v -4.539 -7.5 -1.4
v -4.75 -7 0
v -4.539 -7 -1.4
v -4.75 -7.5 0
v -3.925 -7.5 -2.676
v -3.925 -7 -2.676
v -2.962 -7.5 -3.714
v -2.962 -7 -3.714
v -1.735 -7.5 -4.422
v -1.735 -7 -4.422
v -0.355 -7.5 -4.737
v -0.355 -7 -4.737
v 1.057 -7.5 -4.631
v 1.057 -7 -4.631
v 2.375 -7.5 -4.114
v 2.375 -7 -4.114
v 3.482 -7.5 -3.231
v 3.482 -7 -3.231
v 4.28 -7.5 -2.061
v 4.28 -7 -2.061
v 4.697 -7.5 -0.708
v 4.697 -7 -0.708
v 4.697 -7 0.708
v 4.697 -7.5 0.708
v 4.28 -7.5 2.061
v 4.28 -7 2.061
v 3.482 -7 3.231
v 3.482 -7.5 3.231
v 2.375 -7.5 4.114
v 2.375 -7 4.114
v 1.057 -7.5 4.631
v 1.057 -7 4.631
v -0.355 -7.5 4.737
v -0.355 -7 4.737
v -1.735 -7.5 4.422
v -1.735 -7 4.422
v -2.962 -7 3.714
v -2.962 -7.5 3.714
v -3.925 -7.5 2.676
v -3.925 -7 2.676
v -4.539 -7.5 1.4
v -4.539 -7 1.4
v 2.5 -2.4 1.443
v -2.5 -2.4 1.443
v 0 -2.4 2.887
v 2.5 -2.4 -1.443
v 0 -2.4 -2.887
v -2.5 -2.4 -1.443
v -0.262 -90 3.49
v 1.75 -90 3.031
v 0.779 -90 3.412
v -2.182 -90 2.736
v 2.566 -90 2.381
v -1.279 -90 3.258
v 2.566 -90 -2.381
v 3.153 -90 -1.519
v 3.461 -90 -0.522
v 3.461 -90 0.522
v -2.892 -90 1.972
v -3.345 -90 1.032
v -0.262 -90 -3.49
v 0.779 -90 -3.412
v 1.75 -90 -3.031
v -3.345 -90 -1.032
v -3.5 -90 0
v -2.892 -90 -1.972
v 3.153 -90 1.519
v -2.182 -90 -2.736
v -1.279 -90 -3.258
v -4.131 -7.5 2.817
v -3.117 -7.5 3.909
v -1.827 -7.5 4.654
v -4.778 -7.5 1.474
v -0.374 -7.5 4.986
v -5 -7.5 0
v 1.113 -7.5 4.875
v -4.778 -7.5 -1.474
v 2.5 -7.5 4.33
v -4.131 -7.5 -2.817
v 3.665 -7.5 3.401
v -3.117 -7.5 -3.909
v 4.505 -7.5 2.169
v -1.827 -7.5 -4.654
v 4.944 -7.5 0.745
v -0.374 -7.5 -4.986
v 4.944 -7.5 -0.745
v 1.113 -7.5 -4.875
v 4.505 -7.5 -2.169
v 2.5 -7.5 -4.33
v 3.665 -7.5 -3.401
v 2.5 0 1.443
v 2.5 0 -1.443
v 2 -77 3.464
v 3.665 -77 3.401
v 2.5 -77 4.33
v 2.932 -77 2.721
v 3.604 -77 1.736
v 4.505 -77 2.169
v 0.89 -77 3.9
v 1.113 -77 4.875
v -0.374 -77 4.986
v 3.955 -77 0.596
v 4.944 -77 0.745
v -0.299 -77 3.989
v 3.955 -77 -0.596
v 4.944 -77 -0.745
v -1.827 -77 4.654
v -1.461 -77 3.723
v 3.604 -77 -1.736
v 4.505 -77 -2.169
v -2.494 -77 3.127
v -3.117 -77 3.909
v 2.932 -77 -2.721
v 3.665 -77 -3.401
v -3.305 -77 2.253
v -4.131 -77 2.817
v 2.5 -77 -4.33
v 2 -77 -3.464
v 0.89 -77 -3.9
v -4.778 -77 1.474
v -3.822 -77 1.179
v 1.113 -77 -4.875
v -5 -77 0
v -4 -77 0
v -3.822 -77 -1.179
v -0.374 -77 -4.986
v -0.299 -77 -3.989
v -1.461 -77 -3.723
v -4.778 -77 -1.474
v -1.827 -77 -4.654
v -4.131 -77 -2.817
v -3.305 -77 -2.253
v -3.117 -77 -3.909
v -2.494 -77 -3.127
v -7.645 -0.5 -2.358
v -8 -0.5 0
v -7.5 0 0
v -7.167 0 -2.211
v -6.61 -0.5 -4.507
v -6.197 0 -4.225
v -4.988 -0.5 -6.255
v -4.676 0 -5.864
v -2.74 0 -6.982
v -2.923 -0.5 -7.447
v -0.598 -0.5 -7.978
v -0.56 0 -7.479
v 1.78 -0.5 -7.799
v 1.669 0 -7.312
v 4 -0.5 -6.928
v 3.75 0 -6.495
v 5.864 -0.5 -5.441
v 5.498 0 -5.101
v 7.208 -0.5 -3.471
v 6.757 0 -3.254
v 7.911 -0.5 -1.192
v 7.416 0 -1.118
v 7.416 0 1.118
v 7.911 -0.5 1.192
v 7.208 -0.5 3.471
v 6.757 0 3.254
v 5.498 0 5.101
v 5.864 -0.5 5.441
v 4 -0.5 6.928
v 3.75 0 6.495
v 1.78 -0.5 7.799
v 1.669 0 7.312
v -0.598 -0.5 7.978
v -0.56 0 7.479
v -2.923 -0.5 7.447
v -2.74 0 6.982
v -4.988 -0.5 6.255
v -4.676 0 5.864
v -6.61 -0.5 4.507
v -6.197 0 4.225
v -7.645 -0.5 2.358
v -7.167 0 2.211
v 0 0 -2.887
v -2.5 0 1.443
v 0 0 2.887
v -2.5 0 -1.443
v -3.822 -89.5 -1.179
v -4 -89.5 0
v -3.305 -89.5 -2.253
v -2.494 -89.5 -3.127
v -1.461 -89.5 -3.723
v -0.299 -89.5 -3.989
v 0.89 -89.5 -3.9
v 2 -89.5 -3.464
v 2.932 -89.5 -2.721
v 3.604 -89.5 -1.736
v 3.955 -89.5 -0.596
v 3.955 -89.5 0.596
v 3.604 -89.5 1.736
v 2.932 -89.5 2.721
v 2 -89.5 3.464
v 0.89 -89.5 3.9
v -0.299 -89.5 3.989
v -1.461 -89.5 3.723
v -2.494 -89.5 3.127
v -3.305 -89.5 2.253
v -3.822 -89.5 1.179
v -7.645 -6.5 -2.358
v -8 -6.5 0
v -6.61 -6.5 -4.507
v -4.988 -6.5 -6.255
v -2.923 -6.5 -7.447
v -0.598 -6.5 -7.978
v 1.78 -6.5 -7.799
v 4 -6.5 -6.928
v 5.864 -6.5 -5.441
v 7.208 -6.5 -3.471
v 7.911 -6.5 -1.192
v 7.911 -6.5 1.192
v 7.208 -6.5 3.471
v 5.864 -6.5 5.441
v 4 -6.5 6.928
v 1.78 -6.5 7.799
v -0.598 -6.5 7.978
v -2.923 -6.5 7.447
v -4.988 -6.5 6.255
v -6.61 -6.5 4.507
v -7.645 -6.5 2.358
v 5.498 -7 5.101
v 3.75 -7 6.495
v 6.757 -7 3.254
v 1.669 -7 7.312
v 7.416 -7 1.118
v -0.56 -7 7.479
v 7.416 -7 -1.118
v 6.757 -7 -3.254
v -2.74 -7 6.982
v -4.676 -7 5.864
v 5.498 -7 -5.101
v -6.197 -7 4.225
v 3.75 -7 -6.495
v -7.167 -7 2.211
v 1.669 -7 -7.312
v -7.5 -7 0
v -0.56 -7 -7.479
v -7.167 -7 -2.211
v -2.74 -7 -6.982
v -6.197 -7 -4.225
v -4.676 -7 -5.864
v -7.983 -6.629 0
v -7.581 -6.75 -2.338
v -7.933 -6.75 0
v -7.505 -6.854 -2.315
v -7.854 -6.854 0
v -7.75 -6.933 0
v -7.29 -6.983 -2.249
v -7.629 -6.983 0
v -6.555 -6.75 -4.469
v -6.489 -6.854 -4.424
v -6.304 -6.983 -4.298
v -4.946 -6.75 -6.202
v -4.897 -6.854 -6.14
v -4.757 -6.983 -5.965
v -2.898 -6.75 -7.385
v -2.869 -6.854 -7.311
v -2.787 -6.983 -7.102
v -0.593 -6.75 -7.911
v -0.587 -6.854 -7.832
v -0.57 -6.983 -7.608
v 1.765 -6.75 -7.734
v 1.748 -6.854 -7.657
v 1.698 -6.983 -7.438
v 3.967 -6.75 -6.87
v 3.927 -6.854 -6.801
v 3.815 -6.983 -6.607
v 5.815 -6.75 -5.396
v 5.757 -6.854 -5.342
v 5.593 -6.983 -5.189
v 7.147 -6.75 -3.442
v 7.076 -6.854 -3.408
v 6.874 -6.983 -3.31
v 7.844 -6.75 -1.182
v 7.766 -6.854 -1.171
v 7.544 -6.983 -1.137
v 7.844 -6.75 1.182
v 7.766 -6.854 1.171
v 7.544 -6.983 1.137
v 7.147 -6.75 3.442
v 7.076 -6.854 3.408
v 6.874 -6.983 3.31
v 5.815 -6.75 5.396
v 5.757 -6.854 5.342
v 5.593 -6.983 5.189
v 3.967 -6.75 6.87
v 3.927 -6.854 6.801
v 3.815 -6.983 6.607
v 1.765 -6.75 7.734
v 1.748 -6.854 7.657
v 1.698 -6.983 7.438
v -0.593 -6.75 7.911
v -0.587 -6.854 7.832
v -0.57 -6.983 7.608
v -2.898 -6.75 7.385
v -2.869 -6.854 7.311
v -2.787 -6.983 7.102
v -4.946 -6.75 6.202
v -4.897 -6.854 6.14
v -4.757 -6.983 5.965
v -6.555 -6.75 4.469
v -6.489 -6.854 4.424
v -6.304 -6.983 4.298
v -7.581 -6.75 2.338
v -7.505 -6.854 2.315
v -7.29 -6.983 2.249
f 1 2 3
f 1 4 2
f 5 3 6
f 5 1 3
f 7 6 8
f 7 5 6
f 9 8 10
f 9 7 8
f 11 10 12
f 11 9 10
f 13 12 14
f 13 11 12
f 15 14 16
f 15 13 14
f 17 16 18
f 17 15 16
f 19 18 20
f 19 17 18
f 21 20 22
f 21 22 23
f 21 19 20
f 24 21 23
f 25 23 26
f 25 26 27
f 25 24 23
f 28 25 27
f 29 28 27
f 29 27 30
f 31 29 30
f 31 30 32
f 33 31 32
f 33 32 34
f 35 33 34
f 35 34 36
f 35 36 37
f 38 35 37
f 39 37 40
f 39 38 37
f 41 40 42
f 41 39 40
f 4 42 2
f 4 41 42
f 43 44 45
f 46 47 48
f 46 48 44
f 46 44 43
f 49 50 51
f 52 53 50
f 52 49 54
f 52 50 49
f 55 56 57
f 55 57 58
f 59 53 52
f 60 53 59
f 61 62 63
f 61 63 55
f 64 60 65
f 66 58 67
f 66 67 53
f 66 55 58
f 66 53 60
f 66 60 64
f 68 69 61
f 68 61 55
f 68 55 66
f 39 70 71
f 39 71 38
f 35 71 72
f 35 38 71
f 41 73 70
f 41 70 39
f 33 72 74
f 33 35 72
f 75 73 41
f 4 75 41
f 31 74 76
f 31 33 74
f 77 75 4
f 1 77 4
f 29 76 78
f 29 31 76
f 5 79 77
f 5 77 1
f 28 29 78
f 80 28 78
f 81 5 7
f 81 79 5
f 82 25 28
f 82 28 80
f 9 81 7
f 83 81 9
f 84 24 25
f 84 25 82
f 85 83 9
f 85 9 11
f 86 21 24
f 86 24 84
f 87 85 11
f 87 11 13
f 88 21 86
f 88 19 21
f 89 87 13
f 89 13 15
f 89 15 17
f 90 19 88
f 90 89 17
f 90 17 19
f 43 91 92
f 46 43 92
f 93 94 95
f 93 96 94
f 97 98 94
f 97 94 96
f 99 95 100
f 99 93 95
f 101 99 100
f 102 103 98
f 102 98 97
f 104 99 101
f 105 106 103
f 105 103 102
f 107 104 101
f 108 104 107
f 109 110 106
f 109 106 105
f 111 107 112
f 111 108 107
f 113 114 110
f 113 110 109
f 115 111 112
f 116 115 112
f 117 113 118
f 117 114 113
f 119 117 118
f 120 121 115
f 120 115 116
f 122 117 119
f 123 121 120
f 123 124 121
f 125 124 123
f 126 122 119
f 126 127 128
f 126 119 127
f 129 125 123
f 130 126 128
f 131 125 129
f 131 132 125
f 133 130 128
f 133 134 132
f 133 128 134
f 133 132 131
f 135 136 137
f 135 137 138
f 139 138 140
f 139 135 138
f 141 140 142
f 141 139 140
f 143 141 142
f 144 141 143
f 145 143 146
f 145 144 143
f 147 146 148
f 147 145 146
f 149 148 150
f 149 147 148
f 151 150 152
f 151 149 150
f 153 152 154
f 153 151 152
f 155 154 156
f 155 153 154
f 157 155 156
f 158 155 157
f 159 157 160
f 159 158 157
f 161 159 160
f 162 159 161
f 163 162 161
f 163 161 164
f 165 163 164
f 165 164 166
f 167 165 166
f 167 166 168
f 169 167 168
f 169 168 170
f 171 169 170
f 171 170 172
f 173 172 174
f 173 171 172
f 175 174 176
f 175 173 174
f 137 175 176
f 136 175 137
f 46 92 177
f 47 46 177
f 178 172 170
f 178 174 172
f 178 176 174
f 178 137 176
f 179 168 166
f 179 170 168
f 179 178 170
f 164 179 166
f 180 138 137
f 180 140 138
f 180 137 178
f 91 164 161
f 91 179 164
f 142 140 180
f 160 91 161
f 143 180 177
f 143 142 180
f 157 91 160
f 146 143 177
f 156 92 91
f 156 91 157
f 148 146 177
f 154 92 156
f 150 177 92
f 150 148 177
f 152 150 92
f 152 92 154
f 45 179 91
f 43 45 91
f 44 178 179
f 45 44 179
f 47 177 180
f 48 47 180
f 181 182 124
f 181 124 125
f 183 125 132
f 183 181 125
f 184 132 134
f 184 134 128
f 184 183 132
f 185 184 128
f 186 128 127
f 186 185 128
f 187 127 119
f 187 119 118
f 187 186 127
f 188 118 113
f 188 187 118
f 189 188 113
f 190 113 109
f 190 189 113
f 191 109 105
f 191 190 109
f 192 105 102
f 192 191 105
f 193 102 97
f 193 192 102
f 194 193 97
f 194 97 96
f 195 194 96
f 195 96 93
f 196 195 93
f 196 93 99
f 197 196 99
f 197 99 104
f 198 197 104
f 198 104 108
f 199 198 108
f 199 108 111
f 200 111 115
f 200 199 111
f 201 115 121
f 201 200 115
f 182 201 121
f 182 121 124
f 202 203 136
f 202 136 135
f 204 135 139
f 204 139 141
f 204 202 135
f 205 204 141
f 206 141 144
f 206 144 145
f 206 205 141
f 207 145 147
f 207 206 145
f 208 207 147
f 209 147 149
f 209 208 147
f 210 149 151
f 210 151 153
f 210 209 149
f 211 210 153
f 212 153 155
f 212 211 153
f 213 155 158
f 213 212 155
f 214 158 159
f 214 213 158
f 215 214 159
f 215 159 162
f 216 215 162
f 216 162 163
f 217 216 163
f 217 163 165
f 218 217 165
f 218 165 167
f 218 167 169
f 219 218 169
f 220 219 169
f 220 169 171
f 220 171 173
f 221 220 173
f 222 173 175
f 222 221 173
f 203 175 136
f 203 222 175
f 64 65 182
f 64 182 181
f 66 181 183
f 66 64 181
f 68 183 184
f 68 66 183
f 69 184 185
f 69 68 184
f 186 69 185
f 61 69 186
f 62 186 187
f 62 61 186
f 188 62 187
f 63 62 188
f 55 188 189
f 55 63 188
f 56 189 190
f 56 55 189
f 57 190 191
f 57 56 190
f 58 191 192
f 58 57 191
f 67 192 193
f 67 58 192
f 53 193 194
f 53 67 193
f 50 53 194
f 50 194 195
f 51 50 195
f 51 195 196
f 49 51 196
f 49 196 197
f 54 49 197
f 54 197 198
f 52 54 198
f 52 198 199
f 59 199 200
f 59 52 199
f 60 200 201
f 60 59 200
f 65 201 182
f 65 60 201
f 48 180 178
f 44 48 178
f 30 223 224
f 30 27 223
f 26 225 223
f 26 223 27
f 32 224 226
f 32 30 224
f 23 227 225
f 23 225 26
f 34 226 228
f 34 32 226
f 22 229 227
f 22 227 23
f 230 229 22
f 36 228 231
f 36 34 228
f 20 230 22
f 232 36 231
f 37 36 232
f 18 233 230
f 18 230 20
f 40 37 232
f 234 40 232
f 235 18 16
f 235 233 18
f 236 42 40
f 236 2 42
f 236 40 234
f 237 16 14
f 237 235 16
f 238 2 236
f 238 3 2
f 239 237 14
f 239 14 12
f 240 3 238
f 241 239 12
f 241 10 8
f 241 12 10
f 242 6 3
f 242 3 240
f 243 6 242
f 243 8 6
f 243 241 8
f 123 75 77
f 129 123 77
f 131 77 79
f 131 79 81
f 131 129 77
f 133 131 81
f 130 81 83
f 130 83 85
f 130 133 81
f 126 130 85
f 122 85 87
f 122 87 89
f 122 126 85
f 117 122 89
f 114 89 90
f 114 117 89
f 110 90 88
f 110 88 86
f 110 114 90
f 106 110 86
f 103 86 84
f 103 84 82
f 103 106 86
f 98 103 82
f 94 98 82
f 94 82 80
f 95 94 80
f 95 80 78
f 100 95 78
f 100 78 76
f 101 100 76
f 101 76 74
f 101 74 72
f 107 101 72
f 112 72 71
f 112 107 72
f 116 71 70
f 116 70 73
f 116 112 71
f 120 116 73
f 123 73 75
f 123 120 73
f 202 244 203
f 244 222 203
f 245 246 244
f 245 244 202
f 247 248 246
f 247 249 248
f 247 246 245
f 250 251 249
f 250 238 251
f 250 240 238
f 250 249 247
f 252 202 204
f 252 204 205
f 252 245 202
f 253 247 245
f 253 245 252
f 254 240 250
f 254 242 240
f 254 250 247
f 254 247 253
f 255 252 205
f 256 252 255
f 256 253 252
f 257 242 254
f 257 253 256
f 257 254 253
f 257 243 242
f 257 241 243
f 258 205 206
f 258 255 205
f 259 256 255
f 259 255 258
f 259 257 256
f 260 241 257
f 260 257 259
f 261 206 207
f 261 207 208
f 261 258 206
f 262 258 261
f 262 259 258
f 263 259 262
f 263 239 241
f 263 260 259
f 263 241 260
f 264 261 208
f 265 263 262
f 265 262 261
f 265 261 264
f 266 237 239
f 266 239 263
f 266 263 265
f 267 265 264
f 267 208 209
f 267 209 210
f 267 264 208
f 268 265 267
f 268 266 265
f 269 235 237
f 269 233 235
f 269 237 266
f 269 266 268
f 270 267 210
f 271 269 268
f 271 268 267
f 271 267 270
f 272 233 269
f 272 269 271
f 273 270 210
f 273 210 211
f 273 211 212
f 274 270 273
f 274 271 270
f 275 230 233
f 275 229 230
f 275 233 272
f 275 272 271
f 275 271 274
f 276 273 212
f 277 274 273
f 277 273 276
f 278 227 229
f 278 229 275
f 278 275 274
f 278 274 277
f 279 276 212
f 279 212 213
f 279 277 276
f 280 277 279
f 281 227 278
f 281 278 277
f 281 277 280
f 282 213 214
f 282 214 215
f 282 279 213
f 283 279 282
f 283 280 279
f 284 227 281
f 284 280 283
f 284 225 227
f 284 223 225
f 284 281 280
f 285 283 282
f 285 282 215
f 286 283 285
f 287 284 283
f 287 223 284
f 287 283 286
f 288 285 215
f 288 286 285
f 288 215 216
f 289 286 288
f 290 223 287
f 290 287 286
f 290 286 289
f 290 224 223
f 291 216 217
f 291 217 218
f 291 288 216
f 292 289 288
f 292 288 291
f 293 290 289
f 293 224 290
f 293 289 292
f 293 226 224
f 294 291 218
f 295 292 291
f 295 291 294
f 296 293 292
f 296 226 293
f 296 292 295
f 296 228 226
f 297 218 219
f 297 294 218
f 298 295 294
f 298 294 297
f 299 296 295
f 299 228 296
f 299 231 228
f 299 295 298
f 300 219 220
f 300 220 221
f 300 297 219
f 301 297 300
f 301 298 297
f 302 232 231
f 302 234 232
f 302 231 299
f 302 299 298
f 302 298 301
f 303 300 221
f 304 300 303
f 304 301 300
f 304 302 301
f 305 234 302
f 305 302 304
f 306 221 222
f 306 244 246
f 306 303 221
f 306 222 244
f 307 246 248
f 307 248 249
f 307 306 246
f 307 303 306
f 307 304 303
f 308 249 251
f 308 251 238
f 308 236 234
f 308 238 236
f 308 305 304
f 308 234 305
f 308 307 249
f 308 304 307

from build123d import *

# Parameters (mm, degrees)
CUT_EXTRUDE1_DEPTH = 2.4
CHAMFER1_SIZE      = 0.5
FILLET1_R          = 0.5
CHAMFER2_SIZE      = 0.5


with BuildPart() as part:
    # Sketch1 → Revolve1 (revolve)
    with BuildSketch(Plane.XY, mode=Mode.PRIVATE) as revolve1_sk:
        Polygon((0, 0), (8, 0), (8, -7), (4.75, -7), (4.75, -7.5), (5, -7.5), (5, -77), (4, -77), (4, -90), (0, -90), align=None)
    revolve(revolve1_sk.sketch.rotate(Axis((0, 5, 0), (0, -1, 0)), 180), axis=Axis((0, 5, 0), (0, -1, 0)))

    # Sketch2 → Cut-Extrude1 (cut)
    with BuildSketch(Plane(origin=(0, 0, 0), x_dir=(1, 0, 0), z_dir=(0, 1, 0))):
        Polygon((0, -2.886751346), (2.5, -1.443375673), (2.5, 1.443375673), (0, 2.886751346), (-2.5, 1.443375673), (-2.5, -1.443375673), align=None)
    extrude(amount=-CUT_EXTRUDE1_DEPTH, mode=Mode.SUBTRACT)

    # Chamfer1
    chamfer1_edges = [part.edges().sort_by_distance(p)[0] for p in [
        (8, 0, 0),
    ]]
    chamfer(chamfer1_edges, length=CHAMFER1_SIZE)

    # Fillet1
    fillet1_edges = [part.edges().sort_by_distance(p)[0] for p in [
        (8, -7, 0),
    ]]
    fillet(fillet1_edges, radius=FILLET1_R)

    # Chamfer2
    chamfer2_edges = [part.edges().sort_by_distance(p)[0] for p in [
        (4, -90, 0),
    ]]
    chamfer(chamfer2_edges, length=CHAMFER2_SIZE)


solid = part.part
